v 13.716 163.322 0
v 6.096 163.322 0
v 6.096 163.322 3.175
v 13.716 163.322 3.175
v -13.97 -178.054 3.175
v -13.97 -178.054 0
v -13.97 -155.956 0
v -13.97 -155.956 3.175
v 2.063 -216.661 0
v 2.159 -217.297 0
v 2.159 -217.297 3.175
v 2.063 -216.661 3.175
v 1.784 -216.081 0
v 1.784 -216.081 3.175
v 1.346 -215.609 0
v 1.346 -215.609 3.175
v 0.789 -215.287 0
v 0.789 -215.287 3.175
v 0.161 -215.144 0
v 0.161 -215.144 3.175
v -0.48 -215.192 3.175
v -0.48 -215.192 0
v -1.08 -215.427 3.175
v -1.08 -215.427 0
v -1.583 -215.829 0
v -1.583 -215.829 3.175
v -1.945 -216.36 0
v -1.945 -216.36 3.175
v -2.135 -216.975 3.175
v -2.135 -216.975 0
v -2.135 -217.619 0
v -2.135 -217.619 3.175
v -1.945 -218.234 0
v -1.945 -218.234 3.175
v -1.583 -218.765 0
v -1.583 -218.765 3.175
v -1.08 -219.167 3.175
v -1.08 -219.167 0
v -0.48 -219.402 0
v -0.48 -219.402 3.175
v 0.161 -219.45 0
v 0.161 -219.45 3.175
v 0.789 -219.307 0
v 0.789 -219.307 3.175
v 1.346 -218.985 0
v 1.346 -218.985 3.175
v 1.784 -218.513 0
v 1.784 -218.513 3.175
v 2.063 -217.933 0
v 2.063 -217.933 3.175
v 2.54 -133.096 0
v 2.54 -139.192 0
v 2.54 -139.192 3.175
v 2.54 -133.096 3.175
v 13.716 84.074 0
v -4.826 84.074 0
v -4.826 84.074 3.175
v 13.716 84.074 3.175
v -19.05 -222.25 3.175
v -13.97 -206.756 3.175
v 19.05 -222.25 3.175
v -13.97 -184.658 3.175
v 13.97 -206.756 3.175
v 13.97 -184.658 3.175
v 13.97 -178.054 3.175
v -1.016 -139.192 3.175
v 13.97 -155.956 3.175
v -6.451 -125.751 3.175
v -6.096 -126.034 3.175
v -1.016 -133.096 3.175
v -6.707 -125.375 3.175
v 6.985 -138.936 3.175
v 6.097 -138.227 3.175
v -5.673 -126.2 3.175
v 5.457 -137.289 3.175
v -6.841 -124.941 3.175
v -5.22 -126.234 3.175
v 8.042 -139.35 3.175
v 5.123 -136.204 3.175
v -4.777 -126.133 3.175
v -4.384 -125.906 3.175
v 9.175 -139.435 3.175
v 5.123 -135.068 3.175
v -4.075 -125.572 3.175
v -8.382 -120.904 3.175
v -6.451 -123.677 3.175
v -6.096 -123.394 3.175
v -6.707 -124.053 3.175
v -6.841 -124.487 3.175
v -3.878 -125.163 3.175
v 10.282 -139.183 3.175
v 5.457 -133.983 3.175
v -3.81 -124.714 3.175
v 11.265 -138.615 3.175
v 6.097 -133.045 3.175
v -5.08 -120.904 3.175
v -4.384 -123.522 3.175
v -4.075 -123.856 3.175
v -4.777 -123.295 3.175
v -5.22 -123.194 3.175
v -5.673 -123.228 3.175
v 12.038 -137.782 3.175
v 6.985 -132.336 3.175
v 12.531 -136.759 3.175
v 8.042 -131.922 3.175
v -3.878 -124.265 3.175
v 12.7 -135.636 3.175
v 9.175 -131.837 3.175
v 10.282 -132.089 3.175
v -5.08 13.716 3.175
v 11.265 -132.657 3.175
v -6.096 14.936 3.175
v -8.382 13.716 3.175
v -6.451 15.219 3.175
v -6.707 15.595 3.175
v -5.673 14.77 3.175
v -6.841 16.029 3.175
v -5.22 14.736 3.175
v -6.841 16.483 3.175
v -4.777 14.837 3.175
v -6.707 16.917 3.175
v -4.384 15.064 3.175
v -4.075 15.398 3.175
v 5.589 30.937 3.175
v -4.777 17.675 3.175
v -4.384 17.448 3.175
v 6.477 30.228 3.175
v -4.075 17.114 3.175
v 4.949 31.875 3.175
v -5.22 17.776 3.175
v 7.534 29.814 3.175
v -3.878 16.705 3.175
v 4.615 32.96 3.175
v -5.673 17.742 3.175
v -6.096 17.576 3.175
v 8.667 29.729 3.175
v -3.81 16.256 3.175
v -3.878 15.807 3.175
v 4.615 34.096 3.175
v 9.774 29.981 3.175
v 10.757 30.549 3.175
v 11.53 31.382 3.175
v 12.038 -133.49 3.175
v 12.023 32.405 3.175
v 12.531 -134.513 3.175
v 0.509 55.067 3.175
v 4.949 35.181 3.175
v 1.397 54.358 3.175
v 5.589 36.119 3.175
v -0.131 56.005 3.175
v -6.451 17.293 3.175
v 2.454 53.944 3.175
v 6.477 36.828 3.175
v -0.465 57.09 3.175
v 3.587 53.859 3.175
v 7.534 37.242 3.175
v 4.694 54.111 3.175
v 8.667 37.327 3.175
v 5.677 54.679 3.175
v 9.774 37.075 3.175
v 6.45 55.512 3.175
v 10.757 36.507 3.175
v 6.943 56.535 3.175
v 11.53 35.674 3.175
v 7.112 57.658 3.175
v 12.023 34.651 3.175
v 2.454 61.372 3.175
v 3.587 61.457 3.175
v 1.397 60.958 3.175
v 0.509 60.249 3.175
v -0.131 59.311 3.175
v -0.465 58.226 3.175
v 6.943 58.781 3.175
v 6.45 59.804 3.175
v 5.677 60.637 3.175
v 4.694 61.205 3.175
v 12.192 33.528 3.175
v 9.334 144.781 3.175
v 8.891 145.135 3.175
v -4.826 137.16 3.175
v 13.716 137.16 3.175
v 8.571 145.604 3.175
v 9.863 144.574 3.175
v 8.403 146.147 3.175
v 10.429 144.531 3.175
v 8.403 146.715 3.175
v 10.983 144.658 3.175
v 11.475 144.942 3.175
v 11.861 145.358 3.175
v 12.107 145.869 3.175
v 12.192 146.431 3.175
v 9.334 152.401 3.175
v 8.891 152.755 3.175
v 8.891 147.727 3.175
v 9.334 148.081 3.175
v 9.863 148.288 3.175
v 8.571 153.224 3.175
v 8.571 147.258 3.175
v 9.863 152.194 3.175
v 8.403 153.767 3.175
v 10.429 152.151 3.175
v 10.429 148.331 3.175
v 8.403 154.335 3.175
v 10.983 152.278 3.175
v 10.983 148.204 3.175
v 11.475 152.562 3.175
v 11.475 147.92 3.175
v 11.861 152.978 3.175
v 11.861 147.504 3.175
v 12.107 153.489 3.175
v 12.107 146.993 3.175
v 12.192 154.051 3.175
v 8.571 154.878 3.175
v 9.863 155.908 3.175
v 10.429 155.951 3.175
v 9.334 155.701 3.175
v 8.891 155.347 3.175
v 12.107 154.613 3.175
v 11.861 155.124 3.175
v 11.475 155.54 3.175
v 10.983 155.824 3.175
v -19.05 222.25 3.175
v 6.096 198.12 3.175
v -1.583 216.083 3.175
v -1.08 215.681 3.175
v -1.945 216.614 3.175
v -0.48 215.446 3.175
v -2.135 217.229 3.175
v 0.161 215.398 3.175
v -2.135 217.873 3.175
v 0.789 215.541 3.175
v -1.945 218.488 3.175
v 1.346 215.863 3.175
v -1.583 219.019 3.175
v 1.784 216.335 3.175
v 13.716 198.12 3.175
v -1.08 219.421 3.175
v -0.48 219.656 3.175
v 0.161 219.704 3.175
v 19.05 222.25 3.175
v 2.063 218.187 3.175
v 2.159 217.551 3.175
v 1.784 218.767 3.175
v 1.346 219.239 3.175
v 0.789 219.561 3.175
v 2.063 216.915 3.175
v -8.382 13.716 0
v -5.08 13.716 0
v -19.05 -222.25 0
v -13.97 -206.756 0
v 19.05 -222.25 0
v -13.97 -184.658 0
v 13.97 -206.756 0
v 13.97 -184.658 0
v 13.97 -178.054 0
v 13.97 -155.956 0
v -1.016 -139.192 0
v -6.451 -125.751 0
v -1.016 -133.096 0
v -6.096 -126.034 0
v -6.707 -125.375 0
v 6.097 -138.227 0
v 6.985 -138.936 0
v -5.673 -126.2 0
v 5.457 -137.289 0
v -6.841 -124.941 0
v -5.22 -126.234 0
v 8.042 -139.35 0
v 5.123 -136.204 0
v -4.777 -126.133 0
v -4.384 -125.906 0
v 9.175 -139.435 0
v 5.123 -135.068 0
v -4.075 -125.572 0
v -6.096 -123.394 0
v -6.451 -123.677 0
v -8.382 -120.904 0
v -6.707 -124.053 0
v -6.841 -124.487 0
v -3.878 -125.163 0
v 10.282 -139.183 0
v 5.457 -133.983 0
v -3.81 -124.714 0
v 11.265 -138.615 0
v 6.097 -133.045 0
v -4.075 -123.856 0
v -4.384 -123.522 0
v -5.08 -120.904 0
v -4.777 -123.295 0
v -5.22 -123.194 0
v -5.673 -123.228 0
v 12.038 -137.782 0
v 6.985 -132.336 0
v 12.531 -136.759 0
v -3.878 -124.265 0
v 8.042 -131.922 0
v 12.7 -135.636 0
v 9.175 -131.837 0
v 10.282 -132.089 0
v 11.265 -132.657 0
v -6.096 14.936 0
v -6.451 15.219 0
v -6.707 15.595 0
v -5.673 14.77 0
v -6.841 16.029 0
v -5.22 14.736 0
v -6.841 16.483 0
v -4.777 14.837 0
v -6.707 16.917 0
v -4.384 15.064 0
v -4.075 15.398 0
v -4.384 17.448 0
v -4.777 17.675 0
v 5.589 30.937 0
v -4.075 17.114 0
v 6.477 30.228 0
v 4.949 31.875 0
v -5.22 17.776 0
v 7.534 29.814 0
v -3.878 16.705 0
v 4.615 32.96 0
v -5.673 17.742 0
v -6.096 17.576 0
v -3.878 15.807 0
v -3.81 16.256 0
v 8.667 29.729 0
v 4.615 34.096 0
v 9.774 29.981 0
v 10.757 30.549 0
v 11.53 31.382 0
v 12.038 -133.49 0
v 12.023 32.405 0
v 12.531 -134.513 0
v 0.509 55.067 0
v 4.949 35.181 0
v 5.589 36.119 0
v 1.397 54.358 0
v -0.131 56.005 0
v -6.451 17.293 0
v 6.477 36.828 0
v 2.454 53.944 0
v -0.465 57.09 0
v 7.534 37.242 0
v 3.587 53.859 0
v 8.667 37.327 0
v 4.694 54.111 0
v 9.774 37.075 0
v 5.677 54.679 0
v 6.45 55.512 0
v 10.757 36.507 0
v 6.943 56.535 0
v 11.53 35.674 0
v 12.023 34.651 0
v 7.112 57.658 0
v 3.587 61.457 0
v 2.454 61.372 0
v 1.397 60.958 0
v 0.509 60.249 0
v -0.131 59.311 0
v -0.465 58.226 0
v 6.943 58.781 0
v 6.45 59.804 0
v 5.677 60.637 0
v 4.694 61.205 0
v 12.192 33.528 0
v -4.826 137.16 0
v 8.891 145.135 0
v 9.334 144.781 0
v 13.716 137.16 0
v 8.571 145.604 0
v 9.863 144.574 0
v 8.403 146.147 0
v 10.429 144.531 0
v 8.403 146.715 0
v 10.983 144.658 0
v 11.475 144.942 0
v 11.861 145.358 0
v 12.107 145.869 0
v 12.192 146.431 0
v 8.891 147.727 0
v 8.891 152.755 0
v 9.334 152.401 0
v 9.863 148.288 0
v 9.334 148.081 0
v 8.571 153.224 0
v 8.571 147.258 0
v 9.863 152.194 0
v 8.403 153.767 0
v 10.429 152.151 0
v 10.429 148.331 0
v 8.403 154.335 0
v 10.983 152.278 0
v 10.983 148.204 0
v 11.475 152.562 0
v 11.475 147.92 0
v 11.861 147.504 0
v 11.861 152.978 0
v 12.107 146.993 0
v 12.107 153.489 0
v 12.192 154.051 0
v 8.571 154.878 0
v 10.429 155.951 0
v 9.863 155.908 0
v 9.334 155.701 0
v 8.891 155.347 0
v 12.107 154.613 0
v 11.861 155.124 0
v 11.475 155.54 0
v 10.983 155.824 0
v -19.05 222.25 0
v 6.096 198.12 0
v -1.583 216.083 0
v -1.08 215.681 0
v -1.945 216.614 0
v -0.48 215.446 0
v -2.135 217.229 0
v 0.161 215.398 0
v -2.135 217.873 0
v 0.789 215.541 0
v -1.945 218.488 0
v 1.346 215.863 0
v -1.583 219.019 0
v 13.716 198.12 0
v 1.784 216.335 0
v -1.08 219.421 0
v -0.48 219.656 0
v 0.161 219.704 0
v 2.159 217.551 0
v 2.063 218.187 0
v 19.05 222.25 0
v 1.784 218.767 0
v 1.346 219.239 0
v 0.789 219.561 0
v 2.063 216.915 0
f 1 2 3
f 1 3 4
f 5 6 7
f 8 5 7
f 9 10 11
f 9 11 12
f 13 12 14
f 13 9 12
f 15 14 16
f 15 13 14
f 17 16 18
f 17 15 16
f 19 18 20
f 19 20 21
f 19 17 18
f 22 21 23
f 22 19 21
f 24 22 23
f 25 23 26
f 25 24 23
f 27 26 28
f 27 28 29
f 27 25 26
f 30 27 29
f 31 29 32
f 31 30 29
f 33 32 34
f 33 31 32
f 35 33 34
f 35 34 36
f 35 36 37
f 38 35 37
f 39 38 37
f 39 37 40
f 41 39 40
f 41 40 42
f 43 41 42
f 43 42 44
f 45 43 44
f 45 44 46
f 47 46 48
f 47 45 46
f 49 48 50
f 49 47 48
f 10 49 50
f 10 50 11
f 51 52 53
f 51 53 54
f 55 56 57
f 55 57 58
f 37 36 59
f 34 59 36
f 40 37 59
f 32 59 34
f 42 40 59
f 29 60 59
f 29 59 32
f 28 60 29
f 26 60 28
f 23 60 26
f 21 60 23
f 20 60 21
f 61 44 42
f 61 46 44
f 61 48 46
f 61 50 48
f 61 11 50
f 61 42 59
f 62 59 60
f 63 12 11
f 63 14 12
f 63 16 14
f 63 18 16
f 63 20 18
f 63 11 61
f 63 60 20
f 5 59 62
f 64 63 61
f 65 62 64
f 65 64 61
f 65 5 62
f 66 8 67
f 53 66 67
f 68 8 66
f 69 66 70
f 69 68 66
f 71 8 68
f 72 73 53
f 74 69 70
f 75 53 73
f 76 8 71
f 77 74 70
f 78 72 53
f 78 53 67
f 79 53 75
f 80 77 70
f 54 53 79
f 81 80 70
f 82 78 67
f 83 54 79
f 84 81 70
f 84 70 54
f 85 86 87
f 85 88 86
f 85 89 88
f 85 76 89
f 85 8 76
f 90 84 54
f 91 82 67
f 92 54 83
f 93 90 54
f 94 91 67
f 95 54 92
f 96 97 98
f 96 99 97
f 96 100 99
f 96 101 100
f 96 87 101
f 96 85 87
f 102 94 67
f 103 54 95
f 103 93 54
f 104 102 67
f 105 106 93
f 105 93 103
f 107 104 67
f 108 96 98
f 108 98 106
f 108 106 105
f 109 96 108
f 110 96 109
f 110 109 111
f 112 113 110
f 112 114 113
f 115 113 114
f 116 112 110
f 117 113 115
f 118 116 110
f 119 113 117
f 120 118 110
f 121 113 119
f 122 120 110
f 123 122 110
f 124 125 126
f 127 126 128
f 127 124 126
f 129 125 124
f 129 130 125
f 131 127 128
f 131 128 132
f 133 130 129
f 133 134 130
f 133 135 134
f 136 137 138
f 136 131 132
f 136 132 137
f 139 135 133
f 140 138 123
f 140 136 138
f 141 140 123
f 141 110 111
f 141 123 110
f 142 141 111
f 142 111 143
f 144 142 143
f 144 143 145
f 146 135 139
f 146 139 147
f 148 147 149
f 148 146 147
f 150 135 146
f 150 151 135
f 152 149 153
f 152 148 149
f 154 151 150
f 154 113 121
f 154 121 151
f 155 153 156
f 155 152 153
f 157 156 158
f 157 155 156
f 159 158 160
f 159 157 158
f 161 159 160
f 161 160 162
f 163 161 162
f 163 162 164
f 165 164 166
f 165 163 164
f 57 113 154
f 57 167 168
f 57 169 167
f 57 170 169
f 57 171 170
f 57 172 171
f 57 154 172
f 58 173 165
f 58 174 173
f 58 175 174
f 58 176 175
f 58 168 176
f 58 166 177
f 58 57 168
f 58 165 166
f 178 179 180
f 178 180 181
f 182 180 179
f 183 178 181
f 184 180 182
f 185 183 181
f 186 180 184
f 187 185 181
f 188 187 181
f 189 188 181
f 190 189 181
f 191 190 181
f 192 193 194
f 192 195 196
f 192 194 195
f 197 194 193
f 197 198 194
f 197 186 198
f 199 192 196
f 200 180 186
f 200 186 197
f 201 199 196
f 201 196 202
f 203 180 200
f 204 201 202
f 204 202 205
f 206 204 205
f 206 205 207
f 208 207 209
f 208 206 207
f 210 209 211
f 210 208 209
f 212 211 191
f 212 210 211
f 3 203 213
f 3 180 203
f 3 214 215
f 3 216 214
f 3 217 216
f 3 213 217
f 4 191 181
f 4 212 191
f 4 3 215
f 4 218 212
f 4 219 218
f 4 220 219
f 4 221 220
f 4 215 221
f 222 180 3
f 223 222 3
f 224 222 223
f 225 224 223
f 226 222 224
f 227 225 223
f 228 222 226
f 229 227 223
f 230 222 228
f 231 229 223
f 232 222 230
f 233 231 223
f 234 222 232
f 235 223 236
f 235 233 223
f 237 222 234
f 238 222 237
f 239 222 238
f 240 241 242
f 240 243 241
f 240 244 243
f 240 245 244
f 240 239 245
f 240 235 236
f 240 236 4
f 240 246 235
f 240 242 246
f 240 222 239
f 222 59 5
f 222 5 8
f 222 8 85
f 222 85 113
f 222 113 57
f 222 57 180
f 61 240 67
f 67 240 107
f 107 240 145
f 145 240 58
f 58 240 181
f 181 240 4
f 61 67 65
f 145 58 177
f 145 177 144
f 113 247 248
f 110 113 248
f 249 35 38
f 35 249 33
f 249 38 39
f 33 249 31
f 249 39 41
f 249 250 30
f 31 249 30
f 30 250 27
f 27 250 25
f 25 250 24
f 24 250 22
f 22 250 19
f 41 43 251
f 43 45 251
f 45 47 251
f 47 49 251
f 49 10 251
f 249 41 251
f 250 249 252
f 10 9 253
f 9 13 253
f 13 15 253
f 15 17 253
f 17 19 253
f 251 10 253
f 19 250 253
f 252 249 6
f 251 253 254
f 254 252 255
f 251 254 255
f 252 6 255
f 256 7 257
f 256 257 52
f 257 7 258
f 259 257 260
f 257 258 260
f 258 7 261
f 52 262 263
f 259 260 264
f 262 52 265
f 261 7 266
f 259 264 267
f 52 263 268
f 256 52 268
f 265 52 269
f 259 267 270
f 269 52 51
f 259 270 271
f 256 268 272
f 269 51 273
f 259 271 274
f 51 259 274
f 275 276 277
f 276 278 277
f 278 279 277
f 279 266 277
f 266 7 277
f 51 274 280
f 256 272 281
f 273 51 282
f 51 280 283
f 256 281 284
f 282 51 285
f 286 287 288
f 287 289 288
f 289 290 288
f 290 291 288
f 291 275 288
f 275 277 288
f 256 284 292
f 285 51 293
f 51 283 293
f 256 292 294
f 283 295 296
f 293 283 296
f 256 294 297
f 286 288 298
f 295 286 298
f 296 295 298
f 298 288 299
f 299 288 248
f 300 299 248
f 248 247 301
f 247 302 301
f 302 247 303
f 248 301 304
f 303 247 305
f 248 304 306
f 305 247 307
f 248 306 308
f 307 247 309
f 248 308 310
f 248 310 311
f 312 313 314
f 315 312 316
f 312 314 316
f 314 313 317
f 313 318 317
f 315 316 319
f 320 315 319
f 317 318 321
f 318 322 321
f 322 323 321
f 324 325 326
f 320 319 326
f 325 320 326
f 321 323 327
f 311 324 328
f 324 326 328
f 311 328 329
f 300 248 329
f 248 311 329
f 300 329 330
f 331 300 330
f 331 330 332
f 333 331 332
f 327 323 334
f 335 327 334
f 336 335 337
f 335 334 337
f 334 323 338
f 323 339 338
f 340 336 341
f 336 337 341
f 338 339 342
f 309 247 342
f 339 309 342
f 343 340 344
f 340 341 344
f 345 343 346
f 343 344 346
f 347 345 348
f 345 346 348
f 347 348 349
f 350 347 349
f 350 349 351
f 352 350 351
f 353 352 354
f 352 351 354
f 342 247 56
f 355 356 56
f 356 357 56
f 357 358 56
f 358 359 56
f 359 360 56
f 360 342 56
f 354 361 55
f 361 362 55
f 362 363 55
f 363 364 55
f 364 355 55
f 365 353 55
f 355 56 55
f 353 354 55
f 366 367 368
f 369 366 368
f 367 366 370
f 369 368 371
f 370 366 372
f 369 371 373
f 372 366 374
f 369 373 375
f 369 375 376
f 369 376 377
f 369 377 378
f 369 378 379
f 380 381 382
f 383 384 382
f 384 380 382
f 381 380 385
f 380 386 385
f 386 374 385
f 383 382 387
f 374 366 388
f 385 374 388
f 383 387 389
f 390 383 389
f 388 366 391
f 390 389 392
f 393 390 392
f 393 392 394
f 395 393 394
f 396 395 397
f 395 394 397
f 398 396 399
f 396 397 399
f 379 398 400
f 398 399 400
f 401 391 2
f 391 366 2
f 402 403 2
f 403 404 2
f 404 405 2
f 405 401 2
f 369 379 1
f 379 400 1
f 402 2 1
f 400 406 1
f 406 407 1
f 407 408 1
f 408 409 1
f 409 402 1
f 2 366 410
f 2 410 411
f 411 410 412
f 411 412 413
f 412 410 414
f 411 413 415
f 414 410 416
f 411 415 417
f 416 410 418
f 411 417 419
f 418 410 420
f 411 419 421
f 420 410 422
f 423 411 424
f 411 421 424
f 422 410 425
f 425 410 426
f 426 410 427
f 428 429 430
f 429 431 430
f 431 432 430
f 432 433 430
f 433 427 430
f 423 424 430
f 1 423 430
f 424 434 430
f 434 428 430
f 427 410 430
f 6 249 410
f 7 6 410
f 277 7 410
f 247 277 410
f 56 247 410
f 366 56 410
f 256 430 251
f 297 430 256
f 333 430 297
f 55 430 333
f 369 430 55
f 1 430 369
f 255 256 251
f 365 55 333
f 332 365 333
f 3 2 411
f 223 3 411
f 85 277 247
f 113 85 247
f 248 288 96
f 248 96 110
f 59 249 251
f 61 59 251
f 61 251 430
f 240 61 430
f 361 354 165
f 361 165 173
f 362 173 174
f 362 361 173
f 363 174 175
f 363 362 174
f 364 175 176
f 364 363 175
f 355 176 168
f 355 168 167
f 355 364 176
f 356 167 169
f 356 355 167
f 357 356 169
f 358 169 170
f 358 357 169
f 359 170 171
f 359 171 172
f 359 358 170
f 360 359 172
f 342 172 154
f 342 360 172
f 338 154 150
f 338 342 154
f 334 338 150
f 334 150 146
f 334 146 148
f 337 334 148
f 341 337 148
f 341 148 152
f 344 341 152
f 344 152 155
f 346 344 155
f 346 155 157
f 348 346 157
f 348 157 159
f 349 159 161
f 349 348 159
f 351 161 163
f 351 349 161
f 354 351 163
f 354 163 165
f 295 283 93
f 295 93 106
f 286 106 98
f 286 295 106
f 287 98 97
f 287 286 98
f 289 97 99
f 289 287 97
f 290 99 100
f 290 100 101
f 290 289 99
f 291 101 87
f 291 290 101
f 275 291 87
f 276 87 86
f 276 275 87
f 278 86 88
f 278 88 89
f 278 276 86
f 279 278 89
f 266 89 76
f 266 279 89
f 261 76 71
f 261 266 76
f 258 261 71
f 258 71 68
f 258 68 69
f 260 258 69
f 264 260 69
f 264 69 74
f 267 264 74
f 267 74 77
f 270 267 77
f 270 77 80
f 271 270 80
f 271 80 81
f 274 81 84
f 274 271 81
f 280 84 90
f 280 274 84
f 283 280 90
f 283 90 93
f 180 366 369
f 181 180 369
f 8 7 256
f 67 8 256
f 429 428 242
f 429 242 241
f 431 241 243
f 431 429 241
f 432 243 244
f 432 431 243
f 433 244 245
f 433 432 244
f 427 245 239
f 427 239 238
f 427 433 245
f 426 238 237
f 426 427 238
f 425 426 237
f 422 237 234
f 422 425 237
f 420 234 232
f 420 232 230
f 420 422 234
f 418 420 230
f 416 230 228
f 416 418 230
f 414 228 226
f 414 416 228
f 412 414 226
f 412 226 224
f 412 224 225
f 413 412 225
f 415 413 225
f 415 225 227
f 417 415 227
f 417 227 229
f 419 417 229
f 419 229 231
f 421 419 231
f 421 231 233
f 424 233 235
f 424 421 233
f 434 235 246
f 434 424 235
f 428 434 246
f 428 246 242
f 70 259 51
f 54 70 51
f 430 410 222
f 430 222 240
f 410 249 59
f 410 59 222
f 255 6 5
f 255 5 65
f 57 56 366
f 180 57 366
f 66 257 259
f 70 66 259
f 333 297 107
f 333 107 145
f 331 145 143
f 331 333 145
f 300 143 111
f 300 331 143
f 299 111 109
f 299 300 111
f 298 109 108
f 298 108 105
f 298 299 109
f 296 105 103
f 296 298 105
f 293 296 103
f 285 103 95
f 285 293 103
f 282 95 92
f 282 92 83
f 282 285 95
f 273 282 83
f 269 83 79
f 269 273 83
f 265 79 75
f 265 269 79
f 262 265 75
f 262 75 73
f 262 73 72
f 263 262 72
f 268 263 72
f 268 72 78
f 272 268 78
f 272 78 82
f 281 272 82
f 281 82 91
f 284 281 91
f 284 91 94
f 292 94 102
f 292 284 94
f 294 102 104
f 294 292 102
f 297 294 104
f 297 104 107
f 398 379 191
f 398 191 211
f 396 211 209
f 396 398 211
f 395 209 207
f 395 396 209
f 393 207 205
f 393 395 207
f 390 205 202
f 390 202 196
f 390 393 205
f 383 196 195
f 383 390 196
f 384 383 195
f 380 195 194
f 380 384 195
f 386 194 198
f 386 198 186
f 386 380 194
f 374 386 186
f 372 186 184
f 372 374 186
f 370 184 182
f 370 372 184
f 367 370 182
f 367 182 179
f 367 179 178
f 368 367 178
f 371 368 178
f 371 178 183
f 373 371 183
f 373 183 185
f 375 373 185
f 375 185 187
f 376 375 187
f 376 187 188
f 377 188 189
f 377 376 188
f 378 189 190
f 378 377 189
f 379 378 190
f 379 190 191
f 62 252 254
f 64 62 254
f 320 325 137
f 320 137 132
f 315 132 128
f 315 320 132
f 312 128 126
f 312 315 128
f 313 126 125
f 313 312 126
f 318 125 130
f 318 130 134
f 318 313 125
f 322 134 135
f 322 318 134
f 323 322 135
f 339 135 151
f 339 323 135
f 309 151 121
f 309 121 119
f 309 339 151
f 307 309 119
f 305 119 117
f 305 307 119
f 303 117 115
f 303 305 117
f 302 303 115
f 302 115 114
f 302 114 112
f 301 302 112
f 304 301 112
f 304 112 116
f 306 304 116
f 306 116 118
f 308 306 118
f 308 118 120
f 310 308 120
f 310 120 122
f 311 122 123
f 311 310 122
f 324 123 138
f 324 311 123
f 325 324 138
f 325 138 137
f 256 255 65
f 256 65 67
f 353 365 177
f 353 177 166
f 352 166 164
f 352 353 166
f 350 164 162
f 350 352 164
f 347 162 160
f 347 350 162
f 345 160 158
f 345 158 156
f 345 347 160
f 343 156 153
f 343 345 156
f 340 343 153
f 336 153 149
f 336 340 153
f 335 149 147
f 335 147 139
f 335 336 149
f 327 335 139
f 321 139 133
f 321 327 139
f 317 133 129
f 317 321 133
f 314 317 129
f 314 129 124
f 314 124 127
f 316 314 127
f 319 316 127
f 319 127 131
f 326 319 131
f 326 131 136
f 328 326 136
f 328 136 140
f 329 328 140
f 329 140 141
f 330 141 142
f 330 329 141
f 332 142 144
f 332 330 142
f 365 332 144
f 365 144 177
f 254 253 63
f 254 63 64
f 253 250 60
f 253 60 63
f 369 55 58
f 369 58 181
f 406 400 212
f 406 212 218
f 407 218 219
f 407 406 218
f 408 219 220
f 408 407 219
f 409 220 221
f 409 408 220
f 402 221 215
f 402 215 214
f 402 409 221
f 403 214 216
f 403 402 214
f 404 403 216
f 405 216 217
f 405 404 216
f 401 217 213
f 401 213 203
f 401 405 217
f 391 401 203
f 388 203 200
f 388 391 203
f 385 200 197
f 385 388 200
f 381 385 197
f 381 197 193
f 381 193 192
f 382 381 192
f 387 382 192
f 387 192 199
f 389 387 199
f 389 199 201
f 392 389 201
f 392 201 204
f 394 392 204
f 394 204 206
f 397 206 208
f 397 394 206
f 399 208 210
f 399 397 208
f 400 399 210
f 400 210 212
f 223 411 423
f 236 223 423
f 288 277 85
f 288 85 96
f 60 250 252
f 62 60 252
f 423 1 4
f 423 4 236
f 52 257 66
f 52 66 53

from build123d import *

# Parameters (mm, degrees)
F0_W     = 38.1
F0_H     = 444.5
F0_R     = 1.524
F0_W_2   = 3.302
F0_H_2   = 134.62
F0_R_2   = 2.159
F0_W_3   = 27.94
F0_H_3   = 22.098
F0_W_4   = 3.556
F0_H_4   = 6.096
F0_R_3   = 3.81
F0_W_5   = 18.542
F0_H_5   = 53.086
F0_R_4   = 1.905
F0_W_6   = 7.62
F0_H_6   = 34.798
F1_DEPTH = 3.175


with BuildPart() as f1:
    # F0 (on Top) → F1 (new body)
    with BuildSketch(Plane.XY):
        Rectangle(F0_W, F0_H)
        with Locations((-5.334, -124.714)):
            Circle(F0_R, mode=Mode.SUBTRACT)
        with Locations((-6.731, -53.594)):
            Rectangle(F0_W_2, F0_H_2, mode=Mode.SUBTRACT)
        with Locations((0, -217.297)):
            Circle(F0_R_2, mode=Mode.SUBTRACT)
        with Locations((0, -195.707)):
            Rectangle(F0_W_3, F0_H_3, mode=Mode.SUBTRACT)
        with Locations((0, -167.005)):
            Rectangle(F0_W_3, F0_H_3, mode=Mode.SUBTRACT)
        with Locations((0.762, -136.144)):
            Rectangle(F0_W_4, F0_H_4, mode=Mode.SUBTRACT)
        with Locations((8.89, -135.636)):
            Circle(F0_R_3, mode=Mode.SUBTRACT)
        with Locations((-5.334, 16.256)):
            Circle(F0_R, mode=Mode.SUBTRACT)
        with Locations((8.382, 33.528)):
            Circle(F0_R_3, mode=Mode.SUBTRACT)
        with Locations((3.302, 57.658)):
            Circle(F0_R_3, mode=Mode.SUBTRACT)
        with Locations((4.445, 110.617)):
            Rectangle(F0_W_5, F0_H_5, mode=Mode.SUBTRACT)
        with Locations((0, 217.551)):
            Circle(F0_R_2, mode=Mode.SUBTRACT)
        with Locations((10.287, 146.431)):
            Circle(F0_R_4, mode=Mode.SUBTRACT)
        with Locations((10.287, 154.051)):
            Circle(F0_R_4, mode=Mode.SUBTRACT)
        with Locations((9.906, 180.721)):
            Rectangle(F0_W_6, F0_H_6, mode=Mode.SUBTRACT)
    extrude(amount=F1_DEPTH)


solid = f1.part
